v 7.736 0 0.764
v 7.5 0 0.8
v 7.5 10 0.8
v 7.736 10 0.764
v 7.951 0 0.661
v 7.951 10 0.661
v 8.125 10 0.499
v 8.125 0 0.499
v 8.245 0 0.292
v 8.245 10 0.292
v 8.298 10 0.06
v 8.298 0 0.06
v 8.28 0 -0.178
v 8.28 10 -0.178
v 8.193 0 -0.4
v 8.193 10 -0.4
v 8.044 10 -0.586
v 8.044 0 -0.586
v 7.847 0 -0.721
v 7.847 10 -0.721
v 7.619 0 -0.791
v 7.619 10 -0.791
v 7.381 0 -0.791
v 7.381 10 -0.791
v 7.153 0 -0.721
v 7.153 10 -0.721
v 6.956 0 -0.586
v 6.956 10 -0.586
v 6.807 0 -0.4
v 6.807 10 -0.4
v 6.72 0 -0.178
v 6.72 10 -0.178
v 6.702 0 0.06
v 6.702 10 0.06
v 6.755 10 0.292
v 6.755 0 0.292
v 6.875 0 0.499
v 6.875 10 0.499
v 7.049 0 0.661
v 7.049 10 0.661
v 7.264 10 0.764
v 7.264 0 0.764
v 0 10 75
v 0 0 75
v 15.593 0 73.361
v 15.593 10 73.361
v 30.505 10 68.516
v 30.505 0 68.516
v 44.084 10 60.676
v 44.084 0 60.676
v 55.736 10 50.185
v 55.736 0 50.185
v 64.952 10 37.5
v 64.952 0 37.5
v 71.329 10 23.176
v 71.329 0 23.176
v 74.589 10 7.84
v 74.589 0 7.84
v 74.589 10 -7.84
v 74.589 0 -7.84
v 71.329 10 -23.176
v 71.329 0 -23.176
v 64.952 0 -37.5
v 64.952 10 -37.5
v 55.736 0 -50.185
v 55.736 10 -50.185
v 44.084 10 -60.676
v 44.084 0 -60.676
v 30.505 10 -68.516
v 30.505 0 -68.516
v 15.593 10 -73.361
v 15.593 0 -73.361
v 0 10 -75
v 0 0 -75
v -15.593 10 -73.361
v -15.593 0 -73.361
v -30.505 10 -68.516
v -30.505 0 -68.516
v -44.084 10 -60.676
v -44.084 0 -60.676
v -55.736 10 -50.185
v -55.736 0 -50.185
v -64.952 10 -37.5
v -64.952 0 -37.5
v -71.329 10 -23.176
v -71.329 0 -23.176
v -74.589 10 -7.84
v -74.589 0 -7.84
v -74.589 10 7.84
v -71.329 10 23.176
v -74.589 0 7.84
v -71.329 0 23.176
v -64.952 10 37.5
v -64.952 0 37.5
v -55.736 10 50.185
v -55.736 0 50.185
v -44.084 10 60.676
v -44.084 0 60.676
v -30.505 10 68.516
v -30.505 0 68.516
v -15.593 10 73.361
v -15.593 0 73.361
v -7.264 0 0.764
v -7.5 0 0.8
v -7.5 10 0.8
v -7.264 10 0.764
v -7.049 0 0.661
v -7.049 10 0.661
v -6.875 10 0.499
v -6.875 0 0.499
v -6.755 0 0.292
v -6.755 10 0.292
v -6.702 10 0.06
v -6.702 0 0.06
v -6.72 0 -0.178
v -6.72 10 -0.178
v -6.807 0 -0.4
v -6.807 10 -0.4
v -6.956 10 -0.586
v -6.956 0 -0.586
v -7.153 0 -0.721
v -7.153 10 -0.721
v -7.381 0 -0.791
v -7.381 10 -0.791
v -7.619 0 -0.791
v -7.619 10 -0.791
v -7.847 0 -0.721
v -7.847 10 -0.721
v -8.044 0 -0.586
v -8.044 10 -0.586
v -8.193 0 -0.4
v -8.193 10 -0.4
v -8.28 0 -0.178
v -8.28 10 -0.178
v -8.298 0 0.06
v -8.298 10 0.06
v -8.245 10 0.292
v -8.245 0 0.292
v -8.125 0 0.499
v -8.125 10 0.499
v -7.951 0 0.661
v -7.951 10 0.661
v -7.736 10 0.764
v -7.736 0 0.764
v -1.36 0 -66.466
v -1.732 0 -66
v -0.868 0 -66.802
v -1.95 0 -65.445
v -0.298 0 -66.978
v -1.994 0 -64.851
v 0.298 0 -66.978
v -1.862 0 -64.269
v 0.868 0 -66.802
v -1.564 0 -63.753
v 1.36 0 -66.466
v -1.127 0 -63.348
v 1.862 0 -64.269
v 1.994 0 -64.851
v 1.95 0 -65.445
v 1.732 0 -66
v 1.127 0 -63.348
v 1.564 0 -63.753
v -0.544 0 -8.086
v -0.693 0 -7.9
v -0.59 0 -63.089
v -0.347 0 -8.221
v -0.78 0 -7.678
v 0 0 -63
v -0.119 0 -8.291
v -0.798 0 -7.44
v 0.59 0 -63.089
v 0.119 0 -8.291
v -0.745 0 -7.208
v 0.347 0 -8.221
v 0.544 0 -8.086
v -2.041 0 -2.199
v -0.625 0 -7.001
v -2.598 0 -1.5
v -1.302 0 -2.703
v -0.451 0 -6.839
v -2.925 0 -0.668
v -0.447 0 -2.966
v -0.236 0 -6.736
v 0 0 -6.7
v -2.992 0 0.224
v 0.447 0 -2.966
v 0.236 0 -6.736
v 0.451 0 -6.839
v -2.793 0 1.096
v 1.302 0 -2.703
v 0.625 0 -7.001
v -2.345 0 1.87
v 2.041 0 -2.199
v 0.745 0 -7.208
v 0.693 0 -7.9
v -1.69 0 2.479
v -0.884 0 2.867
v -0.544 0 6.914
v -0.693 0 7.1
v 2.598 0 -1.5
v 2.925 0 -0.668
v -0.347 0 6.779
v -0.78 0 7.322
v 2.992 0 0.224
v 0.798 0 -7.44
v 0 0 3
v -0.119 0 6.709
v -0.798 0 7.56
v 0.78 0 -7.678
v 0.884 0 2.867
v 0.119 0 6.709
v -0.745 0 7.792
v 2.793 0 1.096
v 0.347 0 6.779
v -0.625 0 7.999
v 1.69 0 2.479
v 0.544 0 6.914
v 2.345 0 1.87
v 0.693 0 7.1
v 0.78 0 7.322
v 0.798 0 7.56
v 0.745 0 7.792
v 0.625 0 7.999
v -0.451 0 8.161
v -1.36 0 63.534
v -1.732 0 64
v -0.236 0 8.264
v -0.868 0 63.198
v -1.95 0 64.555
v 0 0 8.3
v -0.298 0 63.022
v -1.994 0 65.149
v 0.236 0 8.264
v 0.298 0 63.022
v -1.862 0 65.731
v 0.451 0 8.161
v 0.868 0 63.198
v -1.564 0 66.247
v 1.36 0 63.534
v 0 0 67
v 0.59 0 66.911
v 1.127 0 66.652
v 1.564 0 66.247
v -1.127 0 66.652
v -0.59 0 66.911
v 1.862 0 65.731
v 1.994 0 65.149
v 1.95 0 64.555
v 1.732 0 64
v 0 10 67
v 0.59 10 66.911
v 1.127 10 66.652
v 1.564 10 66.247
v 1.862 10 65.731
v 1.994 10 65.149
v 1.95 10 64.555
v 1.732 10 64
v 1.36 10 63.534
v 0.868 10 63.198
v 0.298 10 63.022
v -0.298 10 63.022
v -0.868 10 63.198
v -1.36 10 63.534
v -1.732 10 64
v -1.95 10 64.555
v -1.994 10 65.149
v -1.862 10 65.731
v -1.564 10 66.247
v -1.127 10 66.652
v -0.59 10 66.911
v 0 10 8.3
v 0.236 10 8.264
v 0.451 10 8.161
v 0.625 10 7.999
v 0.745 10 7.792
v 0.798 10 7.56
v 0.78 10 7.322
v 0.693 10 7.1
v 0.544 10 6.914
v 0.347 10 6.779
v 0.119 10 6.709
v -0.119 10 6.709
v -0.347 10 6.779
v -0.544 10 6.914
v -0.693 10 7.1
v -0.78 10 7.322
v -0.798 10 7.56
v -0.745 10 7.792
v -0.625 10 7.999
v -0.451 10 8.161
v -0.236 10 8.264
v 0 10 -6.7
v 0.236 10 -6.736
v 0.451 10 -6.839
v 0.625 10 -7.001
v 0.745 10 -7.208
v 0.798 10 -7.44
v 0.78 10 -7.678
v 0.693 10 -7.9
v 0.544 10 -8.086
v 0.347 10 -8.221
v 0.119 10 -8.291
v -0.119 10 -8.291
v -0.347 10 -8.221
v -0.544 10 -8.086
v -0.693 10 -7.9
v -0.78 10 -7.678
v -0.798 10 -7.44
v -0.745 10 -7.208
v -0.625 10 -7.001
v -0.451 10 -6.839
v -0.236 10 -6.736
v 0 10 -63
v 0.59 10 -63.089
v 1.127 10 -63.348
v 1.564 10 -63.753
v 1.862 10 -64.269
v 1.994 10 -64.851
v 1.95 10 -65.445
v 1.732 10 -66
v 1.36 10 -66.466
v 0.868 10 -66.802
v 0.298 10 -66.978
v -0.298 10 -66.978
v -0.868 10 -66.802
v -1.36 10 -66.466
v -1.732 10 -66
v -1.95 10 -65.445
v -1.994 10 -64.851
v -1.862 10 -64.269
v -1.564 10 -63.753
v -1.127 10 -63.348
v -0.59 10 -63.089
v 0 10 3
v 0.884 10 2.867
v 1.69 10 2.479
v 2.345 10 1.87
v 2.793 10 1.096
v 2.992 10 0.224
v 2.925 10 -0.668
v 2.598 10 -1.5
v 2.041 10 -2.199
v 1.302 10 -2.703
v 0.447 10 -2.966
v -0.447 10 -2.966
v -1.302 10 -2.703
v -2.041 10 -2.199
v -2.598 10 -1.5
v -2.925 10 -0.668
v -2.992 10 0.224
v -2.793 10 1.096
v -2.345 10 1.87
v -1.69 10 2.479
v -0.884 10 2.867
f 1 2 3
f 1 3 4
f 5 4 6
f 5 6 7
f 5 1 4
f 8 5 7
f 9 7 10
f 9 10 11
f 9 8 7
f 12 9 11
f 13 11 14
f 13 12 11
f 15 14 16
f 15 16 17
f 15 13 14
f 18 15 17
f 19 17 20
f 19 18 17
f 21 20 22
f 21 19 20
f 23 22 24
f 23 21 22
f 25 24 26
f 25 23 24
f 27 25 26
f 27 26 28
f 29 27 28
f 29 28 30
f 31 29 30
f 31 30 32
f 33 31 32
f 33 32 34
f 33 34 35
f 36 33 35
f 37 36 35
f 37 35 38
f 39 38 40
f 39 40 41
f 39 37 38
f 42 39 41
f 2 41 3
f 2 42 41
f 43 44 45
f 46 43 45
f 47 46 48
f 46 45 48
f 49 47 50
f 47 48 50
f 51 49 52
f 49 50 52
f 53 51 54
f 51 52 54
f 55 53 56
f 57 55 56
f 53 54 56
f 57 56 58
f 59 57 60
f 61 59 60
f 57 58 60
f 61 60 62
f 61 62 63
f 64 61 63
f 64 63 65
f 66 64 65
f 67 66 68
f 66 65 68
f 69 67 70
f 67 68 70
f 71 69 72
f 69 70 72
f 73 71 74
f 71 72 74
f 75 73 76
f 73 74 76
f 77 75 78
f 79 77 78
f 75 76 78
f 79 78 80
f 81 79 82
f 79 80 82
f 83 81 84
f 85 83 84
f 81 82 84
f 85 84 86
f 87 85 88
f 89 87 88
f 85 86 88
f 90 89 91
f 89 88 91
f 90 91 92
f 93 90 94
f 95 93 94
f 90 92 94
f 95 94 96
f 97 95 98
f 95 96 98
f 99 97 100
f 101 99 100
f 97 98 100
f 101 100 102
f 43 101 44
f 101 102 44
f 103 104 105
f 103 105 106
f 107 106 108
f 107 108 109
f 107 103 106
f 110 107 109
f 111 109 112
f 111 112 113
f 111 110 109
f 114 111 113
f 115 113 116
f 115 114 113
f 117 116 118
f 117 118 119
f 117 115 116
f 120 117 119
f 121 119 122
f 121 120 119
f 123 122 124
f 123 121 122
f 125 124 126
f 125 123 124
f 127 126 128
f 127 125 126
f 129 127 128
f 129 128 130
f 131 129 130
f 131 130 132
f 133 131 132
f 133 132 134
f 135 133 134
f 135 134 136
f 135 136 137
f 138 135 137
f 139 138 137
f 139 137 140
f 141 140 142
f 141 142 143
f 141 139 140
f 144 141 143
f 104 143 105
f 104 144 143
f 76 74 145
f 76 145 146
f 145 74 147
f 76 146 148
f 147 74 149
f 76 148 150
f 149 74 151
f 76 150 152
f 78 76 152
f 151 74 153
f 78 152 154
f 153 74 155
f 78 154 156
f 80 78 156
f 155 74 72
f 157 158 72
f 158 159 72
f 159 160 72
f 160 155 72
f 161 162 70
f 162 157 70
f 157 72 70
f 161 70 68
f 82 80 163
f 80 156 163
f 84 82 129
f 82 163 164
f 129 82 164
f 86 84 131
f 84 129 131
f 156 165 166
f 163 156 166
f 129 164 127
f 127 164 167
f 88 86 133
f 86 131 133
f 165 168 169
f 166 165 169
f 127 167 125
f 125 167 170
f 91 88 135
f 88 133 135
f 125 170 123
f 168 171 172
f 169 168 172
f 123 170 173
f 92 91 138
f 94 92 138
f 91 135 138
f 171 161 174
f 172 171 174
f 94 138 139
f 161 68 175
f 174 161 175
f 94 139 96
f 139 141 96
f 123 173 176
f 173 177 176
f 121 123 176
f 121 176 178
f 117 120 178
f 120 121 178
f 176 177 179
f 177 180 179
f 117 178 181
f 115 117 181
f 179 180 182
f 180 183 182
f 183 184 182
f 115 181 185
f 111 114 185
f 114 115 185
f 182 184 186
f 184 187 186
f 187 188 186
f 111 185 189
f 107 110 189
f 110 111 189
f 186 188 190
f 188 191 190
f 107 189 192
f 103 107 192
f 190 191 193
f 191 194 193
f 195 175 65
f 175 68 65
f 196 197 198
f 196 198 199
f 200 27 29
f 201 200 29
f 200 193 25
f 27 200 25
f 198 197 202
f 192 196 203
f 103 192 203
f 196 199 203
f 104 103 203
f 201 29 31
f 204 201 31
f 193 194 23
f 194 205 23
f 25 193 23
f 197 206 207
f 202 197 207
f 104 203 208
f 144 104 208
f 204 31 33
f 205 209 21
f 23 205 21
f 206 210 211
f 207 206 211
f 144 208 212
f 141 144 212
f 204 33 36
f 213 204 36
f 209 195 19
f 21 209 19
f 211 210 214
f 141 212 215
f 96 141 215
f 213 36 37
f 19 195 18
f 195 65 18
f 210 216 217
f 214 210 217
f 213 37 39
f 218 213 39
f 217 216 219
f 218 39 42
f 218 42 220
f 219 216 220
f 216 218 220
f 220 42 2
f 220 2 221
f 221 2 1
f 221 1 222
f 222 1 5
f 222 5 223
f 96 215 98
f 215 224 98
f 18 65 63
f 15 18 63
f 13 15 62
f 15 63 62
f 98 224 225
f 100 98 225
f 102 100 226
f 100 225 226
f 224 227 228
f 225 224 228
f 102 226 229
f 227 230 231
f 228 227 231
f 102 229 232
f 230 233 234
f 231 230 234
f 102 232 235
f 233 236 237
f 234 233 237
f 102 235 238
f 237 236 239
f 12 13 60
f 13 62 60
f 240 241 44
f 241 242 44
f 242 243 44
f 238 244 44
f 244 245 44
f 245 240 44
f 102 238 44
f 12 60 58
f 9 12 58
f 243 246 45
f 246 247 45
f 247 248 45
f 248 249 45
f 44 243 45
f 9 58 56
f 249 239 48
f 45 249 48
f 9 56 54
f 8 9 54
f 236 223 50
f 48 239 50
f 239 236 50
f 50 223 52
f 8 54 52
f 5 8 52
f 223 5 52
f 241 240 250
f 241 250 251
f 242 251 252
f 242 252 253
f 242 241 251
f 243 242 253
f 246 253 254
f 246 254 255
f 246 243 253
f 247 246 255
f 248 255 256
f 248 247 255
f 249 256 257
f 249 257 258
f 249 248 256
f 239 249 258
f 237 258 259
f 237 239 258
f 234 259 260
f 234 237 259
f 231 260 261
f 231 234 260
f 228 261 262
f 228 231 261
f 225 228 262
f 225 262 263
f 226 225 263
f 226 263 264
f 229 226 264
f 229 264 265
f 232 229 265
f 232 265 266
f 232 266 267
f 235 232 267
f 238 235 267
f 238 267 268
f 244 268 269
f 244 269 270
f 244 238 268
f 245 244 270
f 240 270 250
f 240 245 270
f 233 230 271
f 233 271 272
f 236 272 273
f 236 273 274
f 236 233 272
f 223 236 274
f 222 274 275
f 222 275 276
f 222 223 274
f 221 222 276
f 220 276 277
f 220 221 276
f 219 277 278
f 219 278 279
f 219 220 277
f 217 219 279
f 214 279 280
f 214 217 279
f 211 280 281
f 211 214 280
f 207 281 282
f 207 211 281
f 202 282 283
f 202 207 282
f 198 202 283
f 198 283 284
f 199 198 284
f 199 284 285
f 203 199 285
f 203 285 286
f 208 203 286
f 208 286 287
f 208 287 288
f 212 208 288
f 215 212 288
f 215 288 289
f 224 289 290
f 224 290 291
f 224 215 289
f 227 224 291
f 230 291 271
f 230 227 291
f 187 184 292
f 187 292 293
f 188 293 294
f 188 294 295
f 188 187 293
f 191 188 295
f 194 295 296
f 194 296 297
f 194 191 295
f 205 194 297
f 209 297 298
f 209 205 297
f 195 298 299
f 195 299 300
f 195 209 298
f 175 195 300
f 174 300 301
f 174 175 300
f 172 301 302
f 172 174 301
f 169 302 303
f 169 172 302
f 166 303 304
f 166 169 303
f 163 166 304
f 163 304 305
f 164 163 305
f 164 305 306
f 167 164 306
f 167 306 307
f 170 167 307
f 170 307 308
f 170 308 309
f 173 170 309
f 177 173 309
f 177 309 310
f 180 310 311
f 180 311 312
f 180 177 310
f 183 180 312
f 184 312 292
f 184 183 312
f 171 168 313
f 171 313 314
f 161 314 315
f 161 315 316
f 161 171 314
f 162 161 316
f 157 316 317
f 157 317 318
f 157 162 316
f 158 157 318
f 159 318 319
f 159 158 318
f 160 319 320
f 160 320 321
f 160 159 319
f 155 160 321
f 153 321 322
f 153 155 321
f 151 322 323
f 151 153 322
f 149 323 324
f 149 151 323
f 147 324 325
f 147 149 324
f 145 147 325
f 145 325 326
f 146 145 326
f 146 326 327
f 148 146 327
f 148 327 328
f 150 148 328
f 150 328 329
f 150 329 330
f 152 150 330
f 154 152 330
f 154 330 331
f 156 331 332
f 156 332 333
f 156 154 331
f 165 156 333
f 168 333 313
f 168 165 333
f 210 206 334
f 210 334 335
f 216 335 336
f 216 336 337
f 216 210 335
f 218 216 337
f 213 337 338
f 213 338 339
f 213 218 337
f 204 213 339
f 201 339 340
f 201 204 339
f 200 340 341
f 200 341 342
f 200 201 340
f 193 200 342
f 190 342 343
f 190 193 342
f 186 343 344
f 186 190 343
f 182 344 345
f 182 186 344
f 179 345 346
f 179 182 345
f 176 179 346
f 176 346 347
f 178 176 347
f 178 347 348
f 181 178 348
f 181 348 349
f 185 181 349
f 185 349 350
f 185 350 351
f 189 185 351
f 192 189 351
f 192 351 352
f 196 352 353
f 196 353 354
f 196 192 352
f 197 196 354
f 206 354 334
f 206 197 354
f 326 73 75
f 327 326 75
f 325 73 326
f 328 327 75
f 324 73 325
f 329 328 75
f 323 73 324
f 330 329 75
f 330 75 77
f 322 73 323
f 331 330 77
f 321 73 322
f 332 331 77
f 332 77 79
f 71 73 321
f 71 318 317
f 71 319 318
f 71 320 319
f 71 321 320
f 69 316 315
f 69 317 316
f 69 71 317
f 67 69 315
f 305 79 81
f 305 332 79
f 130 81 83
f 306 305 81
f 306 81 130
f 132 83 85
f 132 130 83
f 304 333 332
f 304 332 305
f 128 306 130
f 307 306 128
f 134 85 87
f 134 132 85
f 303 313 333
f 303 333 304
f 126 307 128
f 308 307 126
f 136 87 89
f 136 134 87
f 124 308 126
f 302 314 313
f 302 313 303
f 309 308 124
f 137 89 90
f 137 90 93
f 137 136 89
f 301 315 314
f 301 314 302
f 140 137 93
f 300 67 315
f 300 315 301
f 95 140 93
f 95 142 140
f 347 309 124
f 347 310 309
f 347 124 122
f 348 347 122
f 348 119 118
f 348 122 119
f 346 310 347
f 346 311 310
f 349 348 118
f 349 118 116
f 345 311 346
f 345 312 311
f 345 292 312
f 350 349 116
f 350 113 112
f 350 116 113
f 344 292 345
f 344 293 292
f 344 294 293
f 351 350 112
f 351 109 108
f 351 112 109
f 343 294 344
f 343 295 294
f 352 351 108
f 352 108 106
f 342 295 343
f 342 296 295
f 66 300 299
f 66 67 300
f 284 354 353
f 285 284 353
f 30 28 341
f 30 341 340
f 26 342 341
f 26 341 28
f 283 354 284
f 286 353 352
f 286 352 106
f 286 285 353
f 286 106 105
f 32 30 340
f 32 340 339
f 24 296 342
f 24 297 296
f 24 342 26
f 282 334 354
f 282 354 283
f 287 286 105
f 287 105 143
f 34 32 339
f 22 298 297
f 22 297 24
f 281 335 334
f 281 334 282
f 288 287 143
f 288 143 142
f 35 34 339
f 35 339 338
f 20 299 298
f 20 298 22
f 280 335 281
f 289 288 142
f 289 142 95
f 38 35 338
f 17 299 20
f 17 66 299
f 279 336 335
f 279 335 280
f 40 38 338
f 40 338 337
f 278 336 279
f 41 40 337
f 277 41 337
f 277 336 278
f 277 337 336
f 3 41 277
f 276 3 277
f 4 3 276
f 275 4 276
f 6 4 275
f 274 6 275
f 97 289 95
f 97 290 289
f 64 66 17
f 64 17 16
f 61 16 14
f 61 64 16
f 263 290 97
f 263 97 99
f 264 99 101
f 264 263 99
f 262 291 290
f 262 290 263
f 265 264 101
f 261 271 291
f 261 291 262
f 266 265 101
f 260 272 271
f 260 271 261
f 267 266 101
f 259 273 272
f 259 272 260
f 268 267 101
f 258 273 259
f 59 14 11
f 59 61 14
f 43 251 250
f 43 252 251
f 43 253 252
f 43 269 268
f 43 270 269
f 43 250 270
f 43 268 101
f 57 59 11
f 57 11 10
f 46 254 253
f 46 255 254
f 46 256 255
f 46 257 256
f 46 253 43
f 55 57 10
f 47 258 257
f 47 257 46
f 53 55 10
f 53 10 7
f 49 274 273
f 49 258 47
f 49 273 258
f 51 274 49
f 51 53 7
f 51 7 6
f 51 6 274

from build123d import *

# Parameters (mm, degrees)
ESQUISSE1_R        = 75
ESQUISSE1_R_2      = 0.8
ESQUISSE1_R_3      = 3
ESQUISSE1_R_4      = 2
BOSS_EXTRU_1_DEPTH = 10


with BuildPart() as part:
    # Esquisse1 → Boss.-Extru.1 (new body)
    with BuildSketch(Plane(origin=(0, 0, 0), x_dir=(1, 0, 0), z_dir=(0, 1, 0))):
        with Locations(Location((0, 0, 0), (0, 0, 270))):
            Circle(ESQUISSE1_R)
        with Locations(Location((0, -7.5, 0), (0, 0, 270))):
            Circle(ESQUISSE1_R_2, mode=Mode.SUBTRACT)
        with Locations(Location((-7.5, 0, 0), (0, 0, 270))):
            Circle(ESQUISSE1_R_2, mode=Mode.SUBTRACT)
        with Locations(Location((0, 7.5, 0), (0, 0, 270))):
            Circle(ESQUISSE1_R_2, mode=Mode.SUBTRACT)
        with Locations(Location((7.5, 0, 0), (0, 0, 270))):
            Circle(ESQUISSE1_R_2, mode=Mode.SUBTRACT)
        with Locations(Location((0, 0, 0), (0, 0, 270))):
            Circle(ESQUISSE1_R_3, mode=Mode.SUBTRACT)
        with Locations(Location((0, 65, 0), (0, 0, 270))):
            Circle(ESQUISSE1_R_4, mode=Mode.SUBTRACT)
        with Locations(Location((0, -65, 0), (0, 0, 270))):
            Circle(ESQUISSE1_R_4, mode=Mode.SUBTRACT)
    extrude(amount=BOSS_EXTRU_1_DEPTH)


solid = part.part
